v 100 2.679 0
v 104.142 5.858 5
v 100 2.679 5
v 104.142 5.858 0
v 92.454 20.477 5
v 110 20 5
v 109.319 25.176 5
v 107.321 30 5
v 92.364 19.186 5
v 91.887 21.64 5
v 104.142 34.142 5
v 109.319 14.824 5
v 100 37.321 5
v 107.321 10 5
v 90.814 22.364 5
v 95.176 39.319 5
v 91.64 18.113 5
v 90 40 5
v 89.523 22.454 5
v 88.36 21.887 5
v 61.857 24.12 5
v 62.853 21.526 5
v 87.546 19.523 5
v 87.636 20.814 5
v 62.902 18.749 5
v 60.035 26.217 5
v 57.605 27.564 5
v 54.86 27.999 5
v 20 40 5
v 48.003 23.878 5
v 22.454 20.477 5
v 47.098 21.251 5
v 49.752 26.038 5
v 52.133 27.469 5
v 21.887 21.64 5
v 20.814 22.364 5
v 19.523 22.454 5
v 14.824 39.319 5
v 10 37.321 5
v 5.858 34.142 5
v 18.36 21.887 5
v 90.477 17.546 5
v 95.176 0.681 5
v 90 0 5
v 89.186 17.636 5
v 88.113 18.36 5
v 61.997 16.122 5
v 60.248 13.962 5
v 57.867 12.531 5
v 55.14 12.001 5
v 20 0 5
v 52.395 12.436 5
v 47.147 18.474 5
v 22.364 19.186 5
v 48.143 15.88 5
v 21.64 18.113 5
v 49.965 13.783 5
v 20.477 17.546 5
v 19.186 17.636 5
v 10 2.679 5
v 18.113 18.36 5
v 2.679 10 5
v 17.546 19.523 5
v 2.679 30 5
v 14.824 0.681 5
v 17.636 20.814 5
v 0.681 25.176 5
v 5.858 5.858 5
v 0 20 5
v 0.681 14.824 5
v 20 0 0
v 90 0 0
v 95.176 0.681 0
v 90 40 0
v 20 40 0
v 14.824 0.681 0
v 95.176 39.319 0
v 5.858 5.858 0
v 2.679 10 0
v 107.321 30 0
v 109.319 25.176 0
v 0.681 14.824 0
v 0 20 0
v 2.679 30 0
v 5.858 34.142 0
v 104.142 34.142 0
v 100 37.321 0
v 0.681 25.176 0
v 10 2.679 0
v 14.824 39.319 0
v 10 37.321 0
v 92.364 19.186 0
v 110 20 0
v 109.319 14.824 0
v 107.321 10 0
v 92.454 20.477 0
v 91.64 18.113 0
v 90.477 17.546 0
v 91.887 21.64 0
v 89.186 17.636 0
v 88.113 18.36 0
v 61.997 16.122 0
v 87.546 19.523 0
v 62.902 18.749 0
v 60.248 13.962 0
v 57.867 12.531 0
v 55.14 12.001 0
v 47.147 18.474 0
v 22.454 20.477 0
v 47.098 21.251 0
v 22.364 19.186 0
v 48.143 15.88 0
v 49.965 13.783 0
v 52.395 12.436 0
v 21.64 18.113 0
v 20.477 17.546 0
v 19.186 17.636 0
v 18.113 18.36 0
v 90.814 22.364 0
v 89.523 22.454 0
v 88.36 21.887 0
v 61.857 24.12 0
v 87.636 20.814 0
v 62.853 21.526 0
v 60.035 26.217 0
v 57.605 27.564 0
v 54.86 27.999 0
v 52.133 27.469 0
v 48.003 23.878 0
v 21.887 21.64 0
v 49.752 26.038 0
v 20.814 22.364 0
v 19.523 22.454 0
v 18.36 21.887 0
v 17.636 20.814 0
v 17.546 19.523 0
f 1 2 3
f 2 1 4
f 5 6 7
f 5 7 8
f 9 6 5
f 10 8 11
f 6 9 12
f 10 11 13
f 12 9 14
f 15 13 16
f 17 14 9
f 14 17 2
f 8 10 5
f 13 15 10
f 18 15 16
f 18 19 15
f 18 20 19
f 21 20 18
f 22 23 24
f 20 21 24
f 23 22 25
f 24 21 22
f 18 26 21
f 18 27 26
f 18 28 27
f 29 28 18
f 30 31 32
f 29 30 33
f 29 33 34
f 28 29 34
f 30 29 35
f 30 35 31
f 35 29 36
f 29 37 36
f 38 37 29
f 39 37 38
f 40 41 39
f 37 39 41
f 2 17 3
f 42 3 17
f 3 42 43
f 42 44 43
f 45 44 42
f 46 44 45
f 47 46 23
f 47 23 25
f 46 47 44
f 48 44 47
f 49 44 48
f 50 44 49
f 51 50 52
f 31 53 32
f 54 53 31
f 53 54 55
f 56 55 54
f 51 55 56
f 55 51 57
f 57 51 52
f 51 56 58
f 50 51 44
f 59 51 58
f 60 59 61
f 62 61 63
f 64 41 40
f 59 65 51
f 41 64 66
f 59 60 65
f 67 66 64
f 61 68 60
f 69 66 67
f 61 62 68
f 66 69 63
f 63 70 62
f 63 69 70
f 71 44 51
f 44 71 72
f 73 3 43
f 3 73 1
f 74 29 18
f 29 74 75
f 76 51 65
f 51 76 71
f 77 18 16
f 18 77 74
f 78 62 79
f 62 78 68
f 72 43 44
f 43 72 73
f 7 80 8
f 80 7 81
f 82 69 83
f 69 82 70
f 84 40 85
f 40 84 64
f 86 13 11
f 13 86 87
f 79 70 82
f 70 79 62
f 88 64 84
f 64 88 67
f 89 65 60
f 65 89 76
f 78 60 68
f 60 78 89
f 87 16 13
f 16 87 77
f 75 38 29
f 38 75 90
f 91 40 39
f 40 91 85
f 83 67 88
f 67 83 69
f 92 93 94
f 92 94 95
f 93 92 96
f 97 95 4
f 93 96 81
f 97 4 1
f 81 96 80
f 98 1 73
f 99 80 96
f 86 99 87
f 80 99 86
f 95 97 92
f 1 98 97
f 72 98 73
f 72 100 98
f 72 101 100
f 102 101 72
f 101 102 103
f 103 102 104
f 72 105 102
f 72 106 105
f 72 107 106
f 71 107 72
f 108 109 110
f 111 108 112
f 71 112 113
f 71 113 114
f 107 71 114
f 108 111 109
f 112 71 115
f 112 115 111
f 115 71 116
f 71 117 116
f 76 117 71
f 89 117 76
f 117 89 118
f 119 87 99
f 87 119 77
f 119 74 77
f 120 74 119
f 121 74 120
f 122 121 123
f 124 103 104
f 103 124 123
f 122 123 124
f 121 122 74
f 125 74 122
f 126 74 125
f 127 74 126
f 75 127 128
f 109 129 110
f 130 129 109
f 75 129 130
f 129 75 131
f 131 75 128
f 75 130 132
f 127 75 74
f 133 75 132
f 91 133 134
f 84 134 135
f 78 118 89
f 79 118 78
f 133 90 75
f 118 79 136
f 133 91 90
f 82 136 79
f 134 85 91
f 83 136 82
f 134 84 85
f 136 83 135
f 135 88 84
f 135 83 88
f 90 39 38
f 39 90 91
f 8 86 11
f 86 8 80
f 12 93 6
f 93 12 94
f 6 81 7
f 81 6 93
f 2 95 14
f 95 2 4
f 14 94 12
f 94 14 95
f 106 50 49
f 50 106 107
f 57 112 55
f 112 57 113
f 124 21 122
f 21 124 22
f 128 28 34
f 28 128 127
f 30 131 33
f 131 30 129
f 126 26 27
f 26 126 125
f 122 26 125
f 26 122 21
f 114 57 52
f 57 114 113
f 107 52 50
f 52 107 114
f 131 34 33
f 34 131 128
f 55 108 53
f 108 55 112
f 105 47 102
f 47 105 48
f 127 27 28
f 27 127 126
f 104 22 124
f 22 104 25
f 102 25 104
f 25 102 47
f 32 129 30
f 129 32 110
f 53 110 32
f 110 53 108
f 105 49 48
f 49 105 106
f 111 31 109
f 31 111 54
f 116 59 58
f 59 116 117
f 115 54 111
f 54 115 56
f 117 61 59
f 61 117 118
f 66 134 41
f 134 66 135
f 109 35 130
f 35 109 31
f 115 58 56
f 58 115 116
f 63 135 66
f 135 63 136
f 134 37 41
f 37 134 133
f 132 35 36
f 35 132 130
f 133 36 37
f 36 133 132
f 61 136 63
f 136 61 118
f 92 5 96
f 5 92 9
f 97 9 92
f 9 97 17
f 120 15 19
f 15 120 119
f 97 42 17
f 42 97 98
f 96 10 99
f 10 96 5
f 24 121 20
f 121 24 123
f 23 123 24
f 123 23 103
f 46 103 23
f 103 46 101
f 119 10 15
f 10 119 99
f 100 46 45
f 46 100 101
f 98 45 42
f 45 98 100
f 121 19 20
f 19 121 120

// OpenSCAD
$fn = 32;

// ----------------------------------------------------------------------
// Spacer plate: obround span 70, caps R20
// ----------------------------------------------------------------------

// --- parameters (mm) ---
bore_r = 8;               // centre bore radius
bolt_r = 2.5;             // bolt hole radius
plate_t = 5;              // plate thickness, Z (extrusion height)
span = 70;                // obround span
cap_r = 20;               // cap radius
fit_tol = 0.05;           // declared fit tolerance (prompt contract)
free_tol = 0.2;           // declared free tolerance (prompt contract)

profile = [[20, 40], [14.824, 39.319], [10, 37.321], [5.858, 34.142], [2.679, 30], [0.681, 25.176], [0, 20], [0.681, 14.824], [2.679, 10], [5.858, 5.858], [10, 2.679], [14.824, 0.681], [20, 0], [90, 0], [95.176, 0.681], [100, 2.679], [104.142, 5.858], [107.321, 10], [109.319, 14.824], [110, 20], [109.319, 25.176], [107.321, 30], [104.142, 34.142], [100, 37.321], [95.176, 39.319], [90, 40]];  // primary outline, 26 points, counter clockwise
void_1 = [[62.853, 21.526], [61.857, 24.12], [60.035, 26.217], [57.605, 27.564], [54.86, 27.999], [52.133, 27.469], [49.752, 26.038], [48.003, 23.878], [47.098, 21.251], [47.147, 18.474], [48.143, 15.88], [49.965, 13.783], [52.395, 12.436], [55.14, 12.001], [57.867, 12.531], [60.248, 13.962], [61.997, 16.122], [62.902, 18.749]];  // centre bore, 18 points
void_2 = [[22.454, 20.477], [21.887, 21.64], [20.814, 22.364], [19.523, 22.454], [18.36, 21.887], [17.636, 20.814], [17.546, 19.523], [18.113, 18.36], [19.186, 17.636], [20.477, 17.546], [21.64, 18.113], [22.364, 19.186]];  // end hole, 12 points
void_3 = [[92.454, 20.477], [91.887, 21.64], [90.814, 22.364], [89.523, 22.454], [88.36, 21.887], [87.636, 20.814], [87.546, 19.523], [88.113, 18.36], [89.186, 17.636], [90.477, 17.546], [91.64, 18.113], [92.364, 19.186]];  // end hole, 12 points

// --- the one profile operation ---
difference() {
  linear_extrude(height = plate_t) polygon(points = profile);
  translate([0, 0, -1])
    linear_extrude(height = plate_t + 2) polygon(points = void_1);
  translate([0, 0, -1])
    linear_extrude(height = plate_t + 2) polygon(points = void_2);
  translate([0, 0, -1])
    linear_extrude(height = plate_t + 2) polygon(points = void_3);
}
